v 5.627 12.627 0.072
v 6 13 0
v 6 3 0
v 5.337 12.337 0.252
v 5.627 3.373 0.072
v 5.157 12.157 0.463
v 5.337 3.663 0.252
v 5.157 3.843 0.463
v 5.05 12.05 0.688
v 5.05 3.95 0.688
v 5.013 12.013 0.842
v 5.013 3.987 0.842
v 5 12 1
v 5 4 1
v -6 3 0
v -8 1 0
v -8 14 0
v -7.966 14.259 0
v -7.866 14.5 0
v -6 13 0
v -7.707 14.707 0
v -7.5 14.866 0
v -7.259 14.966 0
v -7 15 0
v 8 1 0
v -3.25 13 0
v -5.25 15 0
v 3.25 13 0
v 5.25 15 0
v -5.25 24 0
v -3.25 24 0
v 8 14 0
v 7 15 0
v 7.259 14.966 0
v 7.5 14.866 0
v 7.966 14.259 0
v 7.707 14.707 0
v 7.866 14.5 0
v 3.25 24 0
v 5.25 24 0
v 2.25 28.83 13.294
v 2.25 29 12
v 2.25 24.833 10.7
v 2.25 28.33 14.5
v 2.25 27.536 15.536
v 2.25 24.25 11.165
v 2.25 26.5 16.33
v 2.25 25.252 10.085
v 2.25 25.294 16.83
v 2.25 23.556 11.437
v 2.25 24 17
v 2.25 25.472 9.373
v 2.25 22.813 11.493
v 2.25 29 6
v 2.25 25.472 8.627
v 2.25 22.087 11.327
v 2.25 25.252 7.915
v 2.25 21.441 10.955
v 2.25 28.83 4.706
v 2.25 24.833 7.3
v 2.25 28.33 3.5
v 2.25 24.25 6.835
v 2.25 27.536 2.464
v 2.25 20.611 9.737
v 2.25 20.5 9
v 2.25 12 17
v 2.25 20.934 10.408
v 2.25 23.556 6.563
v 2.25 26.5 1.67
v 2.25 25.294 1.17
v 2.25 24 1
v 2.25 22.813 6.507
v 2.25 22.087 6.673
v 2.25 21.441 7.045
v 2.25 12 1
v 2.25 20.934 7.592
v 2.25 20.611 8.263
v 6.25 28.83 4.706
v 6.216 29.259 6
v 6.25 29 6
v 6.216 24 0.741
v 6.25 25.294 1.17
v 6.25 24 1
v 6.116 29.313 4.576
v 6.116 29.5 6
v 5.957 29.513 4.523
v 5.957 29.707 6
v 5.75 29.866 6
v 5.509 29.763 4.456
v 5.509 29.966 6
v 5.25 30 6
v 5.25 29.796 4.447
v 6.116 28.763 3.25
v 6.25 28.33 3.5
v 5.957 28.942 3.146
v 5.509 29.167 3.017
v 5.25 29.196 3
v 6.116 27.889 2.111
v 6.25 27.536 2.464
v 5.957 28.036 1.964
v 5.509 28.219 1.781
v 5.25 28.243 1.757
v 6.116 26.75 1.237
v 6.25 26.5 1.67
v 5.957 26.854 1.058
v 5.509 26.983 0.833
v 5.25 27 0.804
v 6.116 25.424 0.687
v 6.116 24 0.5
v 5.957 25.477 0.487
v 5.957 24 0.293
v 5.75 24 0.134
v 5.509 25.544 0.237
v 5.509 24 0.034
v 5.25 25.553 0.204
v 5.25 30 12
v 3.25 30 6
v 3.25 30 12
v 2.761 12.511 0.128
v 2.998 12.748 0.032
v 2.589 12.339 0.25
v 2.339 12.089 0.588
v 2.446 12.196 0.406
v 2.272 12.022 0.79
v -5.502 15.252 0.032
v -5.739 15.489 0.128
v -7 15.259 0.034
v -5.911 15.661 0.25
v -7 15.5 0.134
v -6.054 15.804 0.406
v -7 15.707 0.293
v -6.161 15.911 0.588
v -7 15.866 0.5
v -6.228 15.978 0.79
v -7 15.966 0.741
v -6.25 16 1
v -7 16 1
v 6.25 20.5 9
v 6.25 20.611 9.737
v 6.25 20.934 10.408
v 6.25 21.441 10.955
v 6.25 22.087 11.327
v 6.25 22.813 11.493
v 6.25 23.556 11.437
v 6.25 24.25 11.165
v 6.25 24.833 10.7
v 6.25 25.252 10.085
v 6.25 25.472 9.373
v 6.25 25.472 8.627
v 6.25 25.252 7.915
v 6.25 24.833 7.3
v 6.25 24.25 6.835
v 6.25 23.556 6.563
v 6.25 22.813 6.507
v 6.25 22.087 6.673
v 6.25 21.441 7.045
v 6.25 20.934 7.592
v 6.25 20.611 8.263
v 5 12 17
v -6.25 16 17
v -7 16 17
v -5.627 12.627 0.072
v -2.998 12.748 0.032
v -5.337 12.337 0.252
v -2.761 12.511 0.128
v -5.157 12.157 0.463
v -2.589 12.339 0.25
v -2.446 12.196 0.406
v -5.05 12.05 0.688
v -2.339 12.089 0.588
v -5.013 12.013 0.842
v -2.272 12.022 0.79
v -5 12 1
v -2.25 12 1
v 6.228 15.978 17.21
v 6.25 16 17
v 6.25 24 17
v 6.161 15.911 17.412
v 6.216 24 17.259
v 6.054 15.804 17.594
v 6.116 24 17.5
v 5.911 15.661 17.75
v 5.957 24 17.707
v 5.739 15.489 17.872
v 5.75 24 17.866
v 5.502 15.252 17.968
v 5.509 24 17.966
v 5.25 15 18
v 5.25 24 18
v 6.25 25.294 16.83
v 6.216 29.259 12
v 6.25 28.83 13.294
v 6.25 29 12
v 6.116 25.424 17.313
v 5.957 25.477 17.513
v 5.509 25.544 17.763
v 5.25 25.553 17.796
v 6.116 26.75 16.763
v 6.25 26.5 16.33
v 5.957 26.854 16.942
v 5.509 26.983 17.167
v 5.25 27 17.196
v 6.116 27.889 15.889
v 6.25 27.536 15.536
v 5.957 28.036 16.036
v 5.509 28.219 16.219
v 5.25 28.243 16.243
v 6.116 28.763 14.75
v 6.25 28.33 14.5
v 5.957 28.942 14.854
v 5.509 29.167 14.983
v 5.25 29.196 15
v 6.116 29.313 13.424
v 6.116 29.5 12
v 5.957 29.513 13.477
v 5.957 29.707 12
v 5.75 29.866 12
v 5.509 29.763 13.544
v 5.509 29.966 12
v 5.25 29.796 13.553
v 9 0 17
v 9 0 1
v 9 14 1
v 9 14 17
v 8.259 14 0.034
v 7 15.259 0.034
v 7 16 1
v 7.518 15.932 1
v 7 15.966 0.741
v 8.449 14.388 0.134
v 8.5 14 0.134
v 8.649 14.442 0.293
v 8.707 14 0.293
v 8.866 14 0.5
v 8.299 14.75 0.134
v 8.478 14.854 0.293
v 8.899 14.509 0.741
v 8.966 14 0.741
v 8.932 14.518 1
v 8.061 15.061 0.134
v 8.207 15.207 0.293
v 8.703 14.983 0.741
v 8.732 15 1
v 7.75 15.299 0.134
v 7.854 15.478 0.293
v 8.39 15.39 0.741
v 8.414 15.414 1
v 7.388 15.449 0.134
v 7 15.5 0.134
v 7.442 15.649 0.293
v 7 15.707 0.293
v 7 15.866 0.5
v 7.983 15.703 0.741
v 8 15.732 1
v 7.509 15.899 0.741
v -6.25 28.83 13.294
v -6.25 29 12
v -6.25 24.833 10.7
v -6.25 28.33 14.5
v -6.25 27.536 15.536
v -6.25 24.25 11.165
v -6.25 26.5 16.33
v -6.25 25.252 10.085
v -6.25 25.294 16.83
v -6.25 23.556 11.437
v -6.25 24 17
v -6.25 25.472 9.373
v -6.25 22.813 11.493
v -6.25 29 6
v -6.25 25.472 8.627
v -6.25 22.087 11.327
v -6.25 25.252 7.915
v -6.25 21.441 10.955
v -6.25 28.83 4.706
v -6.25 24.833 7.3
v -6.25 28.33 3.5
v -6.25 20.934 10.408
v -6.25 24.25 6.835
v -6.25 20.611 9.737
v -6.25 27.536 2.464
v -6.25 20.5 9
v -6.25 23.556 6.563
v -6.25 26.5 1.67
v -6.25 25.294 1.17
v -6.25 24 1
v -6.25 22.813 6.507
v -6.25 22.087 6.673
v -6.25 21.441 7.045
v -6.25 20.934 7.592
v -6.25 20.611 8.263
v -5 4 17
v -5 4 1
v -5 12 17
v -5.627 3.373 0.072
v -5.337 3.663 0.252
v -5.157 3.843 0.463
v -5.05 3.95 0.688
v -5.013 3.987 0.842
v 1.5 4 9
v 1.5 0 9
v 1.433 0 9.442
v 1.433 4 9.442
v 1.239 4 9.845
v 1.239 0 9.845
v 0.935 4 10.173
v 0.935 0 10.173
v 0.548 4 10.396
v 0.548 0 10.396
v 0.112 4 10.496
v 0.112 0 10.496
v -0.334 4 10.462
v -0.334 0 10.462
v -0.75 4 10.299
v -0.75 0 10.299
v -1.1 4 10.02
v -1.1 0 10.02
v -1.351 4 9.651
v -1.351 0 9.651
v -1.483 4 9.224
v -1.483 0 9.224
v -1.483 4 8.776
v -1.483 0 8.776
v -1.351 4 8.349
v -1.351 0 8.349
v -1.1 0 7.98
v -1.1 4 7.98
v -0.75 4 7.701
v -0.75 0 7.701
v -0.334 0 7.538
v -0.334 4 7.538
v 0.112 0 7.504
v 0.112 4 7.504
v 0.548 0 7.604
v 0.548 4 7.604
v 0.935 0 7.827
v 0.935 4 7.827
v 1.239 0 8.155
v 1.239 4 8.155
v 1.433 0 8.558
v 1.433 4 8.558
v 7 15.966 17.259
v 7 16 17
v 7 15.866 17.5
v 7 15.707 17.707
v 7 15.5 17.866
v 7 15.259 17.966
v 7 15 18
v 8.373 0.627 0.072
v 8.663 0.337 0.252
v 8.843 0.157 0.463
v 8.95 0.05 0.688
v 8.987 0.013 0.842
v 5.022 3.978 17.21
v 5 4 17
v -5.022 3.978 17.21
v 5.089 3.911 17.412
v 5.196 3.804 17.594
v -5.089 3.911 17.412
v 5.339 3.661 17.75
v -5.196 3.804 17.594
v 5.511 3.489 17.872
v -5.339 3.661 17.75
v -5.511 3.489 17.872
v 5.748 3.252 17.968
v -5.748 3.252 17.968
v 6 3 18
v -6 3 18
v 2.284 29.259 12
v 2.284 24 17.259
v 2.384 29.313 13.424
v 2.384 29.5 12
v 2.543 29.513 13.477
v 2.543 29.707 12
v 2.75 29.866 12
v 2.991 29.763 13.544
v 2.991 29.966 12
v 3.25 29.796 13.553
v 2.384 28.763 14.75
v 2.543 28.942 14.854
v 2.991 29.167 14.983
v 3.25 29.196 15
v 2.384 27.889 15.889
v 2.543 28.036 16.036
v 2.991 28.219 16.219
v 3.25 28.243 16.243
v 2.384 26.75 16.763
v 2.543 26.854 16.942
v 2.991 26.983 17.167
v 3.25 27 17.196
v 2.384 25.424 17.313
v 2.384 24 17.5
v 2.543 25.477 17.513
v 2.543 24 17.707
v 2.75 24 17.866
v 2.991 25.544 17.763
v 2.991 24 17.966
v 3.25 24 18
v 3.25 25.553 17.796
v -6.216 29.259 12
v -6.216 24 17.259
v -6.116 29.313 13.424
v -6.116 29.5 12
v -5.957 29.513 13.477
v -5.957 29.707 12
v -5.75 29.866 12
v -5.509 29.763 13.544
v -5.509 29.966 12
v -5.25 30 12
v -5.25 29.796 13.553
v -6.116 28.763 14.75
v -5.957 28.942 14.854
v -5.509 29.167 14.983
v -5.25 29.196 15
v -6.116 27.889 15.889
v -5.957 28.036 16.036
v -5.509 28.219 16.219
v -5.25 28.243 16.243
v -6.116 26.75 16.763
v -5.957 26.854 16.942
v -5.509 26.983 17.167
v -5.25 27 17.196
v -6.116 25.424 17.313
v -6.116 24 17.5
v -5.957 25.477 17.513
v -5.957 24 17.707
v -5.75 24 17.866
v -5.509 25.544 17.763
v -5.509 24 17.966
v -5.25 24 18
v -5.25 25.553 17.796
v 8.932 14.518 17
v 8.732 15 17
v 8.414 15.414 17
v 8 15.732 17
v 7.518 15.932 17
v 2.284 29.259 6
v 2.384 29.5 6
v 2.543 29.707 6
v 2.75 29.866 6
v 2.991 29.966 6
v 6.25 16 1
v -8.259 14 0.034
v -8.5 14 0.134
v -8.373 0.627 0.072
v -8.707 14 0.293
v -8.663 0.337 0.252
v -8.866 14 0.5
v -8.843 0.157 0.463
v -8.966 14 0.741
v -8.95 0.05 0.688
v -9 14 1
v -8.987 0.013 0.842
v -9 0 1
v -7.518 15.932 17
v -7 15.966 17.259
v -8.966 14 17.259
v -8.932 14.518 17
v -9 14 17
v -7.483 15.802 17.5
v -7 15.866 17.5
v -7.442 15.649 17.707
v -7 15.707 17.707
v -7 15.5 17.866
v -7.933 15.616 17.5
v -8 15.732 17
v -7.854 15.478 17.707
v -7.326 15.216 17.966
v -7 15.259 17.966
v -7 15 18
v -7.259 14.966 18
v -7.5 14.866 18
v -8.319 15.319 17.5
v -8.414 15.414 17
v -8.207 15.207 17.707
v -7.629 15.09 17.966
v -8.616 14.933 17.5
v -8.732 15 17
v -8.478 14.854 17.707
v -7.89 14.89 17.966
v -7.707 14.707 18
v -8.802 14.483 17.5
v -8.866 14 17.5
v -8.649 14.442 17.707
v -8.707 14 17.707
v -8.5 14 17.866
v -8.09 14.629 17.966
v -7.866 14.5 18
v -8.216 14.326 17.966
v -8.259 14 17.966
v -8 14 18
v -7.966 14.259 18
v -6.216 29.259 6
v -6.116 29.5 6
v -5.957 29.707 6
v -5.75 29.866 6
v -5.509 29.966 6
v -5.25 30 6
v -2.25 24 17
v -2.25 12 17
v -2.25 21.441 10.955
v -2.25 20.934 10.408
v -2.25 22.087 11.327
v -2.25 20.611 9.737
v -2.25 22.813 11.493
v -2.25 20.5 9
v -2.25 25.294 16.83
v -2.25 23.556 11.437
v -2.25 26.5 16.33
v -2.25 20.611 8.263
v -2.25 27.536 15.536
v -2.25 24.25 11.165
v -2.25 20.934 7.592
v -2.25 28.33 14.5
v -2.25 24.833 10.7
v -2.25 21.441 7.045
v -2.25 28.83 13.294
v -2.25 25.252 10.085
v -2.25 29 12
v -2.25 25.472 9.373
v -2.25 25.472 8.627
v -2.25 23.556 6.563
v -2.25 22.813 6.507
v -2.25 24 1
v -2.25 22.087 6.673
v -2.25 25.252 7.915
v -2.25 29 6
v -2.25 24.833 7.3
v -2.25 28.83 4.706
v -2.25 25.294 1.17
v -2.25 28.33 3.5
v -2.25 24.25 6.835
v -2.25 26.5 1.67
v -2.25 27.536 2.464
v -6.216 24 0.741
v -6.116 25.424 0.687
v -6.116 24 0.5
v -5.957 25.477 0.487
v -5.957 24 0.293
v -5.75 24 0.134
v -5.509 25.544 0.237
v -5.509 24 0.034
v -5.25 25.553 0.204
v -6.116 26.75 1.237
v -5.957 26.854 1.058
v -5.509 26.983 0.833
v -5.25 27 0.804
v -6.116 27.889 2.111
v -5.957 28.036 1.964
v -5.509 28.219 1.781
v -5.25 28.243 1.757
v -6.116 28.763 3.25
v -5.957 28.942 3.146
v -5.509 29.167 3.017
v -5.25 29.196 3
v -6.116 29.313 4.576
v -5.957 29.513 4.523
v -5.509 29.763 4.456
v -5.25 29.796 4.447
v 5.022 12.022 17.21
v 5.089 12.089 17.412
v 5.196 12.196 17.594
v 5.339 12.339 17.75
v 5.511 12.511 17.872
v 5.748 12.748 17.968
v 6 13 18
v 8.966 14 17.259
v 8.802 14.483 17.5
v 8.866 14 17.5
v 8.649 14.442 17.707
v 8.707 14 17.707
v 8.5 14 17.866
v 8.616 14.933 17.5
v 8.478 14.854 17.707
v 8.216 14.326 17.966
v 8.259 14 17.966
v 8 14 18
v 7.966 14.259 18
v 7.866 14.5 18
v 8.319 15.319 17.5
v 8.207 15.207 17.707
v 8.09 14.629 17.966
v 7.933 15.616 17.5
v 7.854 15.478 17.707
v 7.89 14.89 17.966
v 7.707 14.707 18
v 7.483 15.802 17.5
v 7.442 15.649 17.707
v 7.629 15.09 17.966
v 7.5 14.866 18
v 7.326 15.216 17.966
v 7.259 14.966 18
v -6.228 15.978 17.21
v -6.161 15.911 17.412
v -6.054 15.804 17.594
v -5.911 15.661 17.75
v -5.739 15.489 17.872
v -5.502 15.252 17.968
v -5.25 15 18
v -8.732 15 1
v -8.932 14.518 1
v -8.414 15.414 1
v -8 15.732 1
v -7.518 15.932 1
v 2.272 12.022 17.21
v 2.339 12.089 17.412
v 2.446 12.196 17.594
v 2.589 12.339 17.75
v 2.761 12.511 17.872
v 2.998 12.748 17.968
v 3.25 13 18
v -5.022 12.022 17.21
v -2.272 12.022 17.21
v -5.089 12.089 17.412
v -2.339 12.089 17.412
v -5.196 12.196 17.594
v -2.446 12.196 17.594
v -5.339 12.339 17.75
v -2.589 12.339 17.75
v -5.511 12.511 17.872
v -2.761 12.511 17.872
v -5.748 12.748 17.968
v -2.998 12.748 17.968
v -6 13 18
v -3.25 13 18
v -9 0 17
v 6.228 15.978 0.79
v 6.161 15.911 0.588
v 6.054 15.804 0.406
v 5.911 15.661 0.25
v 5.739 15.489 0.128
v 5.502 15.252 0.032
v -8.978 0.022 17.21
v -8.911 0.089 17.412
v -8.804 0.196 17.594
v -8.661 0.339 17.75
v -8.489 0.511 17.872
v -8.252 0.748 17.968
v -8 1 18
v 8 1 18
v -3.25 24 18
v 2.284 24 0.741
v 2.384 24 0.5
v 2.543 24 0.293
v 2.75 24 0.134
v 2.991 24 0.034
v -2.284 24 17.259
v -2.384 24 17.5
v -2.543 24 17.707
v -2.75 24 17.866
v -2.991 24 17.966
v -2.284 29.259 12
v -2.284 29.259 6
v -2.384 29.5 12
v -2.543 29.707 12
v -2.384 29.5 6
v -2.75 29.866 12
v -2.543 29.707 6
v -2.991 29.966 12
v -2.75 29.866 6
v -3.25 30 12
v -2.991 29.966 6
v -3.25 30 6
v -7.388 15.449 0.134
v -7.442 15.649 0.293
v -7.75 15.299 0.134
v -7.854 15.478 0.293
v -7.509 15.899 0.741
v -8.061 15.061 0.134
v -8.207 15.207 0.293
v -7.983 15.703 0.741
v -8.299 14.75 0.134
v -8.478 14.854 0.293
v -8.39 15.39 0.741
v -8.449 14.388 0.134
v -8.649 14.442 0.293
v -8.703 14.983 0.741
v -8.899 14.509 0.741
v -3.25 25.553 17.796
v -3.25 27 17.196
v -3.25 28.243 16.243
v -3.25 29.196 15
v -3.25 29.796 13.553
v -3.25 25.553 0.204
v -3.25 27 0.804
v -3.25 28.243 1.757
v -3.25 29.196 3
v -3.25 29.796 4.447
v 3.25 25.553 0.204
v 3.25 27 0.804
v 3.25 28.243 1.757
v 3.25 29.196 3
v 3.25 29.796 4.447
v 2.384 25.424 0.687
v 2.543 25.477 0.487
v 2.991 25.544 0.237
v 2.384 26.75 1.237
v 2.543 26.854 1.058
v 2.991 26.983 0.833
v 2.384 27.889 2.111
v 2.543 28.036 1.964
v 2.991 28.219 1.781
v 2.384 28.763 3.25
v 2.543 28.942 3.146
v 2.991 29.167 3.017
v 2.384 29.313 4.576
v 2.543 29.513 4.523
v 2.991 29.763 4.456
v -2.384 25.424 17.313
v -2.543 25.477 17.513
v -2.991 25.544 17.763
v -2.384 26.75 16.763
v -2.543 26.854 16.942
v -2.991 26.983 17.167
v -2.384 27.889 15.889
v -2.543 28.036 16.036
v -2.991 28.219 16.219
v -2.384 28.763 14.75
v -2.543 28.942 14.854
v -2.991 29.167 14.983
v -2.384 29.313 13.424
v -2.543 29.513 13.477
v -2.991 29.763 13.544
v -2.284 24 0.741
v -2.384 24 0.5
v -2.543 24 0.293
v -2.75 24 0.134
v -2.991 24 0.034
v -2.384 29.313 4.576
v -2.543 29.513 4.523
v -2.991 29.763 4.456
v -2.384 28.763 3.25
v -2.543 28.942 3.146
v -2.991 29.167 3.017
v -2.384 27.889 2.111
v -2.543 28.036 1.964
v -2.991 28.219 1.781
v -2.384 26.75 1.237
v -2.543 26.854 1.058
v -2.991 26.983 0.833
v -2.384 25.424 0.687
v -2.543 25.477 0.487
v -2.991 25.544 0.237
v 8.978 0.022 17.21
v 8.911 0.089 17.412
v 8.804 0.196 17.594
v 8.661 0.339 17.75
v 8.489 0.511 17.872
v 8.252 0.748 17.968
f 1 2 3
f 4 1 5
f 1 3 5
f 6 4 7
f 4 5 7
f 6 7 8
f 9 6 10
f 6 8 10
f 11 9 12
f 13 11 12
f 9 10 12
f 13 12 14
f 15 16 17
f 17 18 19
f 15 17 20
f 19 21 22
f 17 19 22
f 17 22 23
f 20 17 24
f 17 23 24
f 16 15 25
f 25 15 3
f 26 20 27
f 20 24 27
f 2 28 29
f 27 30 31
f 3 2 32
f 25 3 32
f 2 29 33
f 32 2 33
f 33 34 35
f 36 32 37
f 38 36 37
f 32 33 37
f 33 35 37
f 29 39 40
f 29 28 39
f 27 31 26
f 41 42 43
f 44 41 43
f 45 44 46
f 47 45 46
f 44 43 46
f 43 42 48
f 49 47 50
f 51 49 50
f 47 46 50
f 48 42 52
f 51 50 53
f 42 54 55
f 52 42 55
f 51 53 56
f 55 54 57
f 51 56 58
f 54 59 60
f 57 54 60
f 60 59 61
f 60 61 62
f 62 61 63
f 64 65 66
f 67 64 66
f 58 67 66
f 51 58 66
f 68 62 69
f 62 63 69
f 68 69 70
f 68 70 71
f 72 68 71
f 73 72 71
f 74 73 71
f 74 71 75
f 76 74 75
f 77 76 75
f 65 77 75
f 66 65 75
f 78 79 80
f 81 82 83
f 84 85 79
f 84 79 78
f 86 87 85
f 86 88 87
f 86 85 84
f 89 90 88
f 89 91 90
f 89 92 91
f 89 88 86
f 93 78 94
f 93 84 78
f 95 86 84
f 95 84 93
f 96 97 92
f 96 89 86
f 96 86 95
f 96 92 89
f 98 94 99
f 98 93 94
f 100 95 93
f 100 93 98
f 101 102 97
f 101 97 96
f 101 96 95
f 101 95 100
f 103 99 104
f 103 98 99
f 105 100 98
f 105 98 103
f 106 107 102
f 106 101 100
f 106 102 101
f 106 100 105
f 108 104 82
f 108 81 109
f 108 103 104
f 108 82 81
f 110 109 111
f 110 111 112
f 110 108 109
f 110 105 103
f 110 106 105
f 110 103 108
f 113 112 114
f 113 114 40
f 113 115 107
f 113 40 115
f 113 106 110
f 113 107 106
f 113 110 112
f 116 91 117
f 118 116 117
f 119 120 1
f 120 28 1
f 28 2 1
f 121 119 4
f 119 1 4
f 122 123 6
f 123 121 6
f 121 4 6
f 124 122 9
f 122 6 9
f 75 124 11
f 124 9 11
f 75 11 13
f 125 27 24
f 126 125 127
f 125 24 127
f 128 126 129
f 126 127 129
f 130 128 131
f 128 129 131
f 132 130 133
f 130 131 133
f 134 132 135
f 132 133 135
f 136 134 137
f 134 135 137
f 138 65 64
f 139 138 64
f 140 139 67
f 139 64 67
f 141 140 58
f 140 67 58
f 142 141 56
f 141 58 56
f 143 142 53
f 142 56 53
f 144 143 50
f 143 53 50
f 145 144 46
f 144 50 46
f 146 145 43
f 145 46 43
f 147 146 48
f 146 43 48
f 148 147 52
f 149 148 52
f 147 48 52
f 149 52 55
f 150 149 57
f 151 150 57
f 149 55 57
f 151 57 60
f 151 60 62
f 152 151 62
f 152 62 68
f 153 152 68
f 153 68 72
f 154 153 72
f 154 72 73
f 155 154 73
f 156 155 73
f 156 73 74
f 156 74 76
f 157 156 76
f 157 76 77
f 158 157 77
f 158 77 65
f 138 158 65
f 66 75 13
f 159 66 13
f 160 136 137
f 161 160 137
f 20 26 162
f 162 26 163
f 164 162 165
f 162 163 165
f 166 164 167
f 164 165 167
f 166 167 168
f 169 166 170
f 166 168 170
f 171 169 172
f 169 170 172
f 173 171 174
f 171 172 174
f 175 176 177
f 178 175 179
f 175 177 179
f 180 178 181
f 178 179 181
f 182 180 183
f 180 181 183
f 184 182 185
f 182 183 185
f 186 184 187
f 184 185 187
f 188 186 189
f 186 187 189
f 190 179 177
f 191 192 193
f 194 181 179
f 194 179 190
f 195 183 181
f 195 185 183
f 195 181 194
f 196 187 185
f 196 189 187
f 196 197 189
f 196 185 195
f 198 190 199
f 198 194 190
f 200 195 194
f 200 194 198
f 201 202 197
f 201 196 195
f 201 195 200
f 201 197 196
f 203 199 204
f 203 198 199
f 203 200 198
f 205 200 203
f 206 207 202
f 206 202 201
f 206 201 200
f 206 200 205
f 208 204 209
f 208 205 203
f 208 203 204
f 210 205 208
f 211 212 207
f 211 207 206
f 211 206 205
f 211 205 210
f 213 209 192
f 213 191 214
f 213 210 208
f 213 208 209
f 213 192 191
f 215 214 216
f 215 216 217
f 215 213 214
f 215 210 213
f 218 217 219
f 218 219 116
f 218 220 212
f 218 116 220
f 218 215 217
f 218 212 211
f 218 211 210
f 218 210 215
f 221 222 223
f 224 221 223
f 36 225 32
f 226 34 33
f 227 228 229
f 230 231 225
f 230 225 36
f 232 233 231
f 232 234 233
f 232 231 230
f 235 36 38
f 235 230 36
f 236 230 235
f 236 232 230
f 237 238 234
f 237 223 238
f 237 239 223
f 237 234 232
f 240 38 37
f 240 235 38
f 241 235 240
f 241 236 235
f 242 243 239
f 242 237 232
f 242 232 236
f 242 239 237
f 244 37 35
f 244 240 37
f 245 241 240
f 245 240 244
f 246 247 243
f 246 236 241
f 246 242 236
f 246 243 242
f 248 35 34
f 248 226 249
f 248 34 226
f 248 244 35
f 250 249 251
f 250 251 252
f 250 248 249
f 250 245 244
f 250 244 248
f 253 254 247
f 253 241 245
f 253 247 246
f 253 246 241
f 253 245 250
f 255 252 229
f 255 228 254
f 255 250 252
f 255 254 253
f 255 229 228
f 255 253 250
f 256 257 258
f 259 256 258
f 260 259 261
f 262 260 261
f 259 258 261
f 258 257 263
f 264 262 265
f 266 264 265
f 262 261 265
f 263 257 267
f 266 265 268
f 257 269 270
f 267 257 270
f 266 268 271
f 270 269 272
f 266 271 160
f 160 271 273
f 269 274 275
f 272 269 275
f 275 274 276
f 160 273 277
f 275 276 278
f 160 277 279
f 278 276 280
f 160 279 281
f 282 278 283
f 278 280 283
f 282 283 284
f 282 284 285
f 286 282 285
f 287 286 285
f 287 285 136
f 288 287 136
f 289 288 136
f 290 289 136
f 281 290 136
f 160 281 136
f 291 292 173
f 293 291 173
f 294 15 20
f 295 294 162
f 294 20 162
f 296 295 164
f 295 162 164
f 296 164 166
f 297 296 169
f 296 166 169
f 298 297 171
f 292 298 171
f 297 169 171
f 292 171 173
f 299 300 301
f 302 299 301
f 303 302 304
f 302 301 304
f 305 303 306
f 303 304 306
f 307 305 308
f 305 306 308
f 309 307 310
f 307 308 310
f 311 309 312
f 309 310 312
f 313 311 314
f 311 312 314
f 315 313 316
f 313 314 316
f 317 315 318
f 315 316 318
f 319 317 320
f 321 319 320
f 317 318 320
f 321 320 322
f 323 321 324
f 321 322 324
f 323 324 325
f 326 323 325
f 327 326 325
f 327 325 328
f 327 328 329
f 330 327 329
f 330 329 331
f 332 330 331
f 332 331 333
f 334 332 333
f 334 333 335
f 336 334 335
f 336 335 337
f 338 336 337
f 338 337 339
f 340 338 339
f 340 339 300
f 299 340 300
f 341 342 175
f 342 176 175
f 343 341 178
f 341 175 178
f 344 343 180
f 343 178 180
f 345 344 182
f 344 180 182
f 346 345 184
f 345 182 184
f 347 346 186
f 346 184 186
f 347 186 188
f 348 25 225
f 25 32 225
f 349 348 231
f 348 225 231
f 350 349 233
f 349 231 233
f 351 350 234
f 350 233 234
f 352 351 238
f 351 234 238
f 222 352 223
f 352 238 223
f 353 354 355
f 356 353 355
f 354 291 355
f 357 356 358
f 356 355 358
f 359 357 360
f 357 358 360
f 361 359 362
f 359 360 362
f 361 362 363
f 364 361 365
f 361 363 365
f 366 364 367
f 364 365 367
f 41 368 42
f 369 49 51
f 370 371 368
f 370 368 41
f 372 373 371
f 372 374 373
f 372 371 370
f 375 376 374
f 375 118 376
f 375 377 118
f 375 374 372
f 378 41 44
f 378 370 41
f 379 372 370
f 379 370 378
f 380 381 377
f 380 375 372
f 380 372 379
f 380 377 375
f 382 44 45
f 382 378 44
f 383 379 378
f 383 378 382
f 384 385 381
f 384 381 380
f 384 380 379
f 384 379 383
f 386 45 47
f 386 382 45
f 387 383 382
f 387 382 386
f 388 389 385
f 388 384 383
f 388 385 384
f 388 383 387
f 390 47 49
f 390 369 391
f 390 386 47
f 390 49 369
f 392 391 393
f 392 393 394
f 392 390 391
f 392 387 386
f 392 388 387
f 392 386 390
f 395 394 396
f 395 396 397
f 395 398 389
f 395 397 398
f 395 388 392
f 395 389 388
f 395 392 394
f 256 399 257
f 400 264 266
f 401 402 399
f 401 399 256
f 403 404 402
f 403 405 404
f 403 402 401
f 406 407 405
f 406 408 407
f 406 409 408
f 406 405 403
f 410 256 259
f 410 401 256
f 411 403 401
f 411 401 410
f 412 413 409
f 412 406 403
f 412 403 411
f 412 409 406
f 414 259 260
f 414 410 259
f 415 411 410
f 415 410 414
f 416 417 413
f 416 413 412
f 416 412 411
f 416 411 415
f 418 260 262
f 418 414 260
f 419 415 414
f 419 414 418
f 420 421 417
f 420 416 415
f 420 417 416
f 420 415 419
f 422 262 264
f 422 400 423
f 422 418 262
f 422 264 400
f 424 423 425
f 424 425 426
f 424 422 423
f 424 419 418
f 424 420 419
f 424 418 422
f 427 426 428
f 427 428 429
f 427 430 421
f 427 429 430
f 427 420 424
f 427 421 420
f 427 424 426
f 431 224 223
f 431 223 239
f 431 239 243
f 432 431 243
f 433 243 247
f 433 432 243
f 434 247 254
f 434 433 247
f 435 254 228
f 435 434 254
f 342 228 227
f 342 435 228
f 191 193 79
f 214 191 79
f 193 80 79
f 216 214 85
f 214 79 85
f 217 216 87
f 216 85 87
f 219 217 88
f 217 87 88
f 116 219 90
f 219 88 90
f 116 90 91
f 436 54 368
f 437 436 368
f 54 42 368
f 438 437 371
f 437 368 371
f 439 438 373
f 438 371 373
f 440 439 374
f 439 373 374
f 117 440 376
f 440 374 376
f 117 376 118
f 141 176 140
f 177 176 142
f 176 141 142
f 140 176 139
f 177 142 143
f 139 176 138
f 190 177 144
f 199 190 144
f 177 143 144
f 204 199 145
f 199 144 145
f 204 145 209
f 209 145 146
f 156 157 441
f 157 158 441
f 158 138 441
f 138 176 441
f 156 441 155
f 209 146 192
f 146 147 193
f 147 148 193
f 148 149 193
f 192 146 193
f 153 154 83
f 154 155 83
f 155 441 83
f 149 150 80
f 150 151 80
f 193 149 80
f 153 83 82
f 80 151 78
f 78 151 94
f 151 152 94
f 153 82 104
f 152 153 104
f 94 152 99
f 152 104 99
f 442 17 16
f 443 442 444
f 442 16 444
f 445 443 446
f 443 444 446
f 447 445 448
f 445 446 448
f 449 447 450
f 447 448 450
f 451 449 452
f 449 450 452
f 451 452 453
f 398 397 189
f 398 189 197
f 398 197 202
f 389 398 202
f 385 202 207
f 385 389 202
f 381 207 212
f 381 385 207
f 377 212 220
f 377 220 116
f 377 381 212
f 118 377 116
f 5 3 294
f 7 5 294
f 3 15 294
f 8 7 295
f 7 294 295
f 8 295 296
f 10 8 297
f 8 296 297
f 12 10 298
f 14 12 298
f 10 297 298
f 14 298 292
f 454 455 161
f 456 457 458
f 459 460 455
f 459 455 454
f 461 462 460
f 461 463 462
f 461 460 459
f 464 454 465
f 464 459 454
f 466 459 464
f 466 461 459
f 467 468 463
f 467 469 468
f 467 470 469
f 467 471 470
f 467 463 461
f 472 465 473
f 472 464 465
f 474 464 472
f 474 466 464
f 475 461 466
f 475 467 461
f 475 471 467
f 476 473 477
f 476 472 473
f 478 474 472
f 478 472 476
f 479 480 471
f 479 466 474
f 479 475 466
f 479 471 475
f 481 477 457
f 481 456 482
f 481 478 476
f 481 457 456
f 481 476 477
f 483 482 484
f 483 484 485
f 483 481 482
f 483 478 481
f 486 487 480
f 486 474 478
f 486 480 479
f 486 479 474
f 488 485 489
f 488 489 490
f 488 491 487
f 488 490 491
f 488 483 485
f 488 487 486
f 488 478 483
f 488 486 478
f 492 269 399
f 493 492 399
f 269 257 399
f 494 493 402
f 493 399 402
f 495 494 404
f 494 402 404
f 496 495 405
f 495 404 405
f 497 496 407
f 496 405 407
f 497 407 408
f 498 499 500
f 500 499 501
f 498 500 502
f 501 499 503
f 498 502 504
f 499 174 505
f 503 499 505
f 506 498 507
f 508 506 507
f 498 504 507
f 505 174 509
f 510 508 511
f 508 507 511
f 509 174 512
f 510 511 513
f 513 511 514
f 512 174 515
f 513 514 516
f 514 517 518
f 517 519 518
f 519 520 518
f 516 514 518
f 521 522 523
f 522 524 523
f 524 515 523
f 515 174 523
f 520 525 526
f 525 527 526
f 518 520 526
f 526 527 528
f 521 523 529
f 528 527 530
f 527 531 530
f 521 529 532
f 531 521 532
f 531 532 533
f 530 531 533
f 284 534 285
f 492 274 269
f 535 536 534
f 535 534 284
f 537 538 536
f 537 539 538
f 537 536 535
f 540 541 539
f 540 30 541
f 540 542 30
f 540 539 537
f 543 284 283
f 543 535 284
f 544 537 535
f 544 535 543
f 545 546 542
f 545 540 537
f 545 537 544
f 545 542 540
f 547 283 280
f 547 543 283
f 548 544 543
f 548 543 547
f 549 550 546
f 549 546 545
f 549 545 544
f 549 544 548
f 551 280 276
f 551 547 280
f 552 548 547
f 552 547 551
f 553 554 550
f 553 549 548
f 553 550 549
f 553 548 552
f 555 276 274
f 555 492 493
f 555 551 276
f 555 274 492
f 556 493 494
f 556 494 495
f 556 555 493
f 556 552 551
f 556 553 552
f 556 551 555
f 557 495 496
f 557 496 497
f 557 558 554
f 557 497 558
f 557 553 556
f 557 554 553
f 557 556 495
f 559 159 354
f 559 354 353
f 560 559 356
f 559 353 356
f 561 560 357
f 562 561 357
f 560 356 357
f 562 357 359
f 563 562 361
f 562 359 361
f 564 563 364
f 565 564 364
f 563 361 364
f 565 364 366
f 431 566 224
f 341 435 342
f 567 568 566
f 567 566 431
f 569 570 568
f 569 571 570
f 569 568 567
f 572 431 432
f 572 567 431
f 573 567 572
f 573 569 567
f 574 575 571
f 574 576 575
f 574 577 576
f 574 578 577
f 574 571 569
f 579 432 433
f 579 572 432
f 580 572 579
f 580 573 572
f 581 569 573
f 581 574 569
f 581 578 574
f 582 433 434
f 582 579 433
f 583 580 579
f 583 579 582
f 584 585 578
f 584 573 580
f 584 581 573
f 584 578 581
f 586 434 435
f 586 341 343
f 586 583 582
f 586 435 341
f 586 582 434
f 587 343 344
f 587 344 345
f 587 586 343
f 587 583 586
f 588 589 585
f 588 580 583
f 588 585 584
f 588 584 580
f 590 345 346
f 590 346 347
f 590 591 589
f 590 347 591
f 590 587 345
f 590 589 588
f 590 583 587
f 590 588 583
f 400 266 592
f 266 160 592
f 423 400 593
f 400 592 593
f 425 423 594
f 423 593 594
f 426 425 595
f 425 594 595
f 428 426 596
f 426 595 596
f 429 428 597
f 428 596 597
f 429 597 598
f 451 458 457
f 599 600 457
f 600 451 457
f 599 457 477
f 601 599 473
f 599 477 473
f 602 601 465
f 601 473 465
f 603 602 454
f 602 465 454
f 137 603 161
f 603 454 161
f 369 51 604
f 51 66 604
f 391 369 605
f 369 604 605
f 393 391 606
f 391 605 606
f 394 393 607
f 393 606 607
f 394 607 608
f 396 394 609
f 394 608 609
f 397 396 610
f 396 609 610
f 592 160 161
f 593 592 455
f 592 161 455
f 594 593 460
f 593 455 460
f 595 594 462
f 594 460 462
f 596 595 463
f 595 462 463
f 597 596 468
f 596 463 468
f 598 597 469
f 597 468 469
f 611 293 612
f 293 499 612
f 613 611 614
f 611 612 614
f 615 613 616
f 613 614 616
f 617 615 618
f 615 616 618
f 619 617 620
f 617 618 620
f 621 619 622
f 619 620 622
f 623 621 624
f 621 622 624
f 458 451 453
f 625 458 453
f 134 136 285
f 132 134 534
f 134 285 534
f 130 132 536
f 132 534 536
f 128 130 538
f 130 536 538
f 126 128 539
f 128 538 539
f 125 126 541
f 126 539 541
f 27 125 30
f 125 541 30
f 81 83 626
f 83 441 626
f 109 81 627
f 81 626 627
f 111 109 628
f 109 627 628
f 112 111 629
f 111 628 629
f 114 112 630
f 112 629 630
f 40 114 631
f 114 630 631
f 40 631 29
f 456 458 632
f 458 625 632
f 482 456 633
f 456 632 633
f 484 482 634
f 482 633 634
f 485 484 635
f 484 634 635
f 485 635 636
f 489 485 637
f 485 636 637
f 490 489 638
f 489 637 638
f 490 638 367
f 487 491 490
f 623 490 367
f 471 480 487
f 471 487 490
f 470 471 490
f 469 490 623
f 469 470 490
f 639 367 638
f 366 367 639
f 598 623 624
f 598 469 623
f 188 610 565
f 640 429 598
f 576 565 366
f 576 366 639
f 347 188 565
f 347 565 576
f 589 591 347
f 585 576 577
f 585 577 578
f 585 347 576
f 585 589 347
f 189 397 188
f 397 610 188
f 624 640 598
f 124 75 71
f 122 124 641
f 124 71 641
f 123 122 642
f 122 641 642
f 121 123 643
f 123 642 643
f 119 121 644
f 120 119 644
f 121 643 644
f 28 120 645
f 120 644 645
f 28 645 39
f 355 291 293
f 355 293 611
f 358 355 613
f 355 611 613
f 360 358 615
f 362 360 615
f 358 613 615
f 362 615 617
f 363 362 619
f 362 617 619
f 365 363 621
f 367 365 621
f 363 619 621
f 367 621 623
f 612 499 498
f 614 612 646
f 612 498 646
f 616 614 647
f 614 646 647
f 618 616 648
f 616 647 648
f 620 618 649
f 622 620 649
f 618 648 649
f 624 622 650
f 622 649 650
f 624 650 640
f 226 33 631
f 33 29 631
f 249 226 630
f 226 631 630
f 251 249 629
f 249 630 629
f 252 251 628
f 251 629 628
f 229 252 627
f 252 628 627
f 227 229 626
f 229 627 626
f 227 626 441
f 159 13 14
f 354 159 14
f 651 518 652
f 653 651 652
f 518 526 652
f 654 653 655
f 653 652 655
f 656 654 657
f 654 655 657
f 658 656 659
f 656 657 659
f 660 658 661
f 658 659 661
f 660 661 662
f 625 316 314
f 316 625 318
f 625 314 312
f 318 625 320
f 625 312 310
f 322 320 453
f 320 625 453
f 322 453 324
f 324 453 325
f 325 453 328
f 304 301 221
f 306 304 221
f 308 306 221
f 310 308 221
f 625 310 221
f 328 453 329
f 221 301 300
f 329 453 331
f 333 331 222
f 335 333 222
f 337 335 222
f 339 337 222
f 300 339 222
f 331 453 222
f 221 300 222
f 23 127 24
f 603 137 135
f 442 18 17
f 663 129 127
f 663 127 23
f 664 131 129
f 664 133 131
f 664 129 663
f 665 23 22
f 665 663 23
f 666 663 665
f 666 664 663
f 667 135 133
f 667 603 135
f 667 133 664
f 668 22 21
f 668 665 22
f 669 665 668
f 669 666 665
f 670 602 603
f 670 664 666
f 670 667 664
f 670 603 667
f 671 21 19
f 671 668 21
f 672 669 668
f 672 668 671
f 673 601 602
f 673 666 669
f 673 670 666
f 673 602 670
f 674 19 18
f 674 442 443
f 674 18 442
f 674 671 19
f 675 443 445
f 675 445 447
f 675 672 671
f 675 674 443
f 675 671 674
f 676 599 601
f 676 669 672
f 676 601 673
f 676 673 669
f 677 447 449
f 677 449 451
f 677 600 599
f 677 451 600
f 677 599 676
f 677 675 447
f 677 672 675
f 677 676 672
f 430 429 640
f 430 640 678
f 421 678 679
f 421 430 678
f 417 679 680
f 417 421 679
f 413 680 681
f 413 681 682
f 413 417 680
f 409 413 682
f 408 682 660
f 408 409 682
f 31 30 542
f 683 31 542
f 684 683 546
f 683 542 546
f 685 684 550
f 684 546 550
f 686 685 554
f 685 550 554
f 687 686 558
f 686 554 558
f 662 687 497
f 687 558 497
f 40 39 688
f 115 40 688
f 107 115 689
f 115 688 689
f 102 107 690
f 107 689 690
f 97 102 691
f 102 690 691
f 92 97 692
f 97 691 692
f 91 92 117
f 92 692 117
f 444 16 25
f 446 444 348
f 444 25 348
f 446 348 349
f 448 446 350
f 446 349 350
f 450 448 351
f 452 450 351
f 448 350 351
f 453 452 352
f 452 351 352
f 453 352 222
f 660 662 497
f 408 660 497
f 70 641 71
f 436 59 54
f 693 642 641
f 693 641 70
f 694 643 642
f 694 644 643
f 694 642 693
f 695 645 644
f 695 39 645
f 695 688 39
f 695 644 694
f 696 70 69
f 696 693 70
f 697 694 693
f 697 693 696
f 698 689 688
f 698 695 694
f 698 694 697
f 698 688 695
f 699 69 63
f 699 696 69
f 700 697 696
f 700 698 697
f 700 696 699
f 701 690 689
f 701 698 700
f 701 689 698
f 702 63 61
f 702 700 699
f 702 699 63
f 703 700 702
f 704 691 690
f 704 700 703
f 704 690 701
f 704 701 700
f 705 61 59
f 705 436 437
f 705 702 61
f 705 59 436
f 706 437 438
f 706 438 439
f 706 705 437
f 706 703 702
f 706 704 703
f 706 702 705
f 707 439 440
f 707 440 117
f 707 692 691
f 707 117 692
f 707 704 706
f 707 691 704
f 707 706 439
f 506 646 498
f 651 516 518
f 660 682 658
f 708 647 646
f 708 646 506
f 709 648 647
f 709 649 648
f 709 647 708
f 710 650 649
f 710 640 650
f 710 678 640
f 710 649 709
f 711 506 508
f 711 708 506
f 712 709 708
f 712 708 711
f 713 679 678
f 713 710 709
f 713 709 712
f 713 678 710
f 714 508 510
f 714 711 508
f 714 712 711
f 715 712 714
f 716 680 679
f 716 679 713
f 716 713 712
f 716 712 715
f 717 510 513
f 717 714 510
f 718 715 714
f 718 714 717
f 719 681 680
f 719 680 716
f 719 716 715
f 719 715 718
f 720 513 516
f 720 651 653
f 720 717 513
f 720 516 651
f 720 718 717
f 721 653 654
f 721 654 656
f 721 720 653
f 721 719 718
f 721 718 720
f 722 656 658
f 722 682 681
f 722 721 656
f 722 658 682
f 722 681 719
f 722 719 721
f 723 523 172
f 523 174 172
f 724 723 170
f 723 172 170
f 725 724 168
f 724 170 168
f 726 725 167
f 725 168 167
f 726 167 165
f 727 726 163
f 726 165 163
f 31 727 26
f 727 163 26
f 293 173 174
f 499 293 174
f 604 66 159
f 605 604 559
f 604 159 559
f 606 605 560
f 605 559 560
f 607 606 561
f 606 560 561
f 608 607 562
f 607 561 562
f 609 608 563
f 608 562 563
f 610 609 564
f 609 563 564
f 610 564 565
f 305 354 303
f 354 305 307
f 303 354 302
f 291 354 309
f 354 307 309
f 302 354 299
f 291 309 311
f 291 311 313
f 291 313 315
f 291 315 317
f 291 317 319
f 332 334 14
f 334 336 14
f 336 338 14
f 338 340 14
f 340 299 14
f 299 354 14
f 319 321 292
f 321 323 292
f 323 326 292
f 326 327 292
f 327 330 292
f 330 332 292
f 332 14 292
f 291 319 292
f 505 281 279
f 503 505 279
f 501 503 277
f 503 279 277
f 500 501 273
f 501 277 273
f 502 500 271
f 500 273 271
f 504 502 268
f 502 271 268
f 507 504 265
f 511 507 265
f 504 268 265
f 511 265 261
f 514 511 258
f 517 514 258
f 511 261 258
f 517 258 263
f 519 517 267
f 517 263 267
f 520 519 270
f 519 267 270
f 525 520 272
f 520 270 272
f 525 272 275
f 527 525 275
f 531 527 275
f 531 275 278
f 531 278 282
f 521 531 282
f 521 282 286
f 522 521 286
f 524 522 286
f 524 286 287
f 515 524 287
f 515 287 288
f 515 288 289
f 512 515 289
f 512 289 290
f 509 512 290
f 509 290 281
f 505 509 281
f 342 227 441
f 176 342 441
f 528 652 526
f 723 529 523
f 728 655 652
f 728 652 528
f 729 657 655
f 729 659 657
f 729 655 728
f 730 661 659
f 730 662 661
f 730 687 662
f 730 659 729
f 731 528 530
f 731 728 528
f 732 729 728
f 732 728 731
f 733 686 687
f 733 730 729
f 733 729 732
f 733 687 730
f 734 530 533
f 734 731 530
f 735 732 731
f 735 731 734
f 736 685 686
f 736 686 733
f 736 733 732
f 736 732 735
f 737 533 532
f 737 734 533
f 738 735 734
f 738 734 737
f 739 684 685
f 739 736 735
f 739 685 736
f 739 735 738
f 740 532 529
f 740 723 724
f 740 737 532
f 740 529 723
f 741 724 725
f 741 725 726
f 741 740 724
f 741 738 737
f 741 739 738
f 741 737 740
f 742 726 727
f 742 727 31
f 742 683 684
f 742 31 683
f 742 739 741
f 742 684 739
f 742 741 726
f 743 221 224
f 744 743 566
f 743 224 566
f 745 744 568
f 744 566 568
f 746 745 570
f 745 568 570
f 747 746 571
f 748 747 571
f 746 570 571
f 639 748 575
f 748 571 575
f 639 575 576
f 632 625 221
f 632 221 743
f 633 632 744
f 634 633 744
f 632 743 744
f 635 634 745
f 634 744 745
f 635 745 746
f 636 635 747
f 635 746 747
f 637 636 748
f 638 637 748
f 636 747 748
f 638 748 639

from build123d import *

# Parameters (mm, degrees)
PAD_DEPTH       = 18
SKETCH002_R     = 2.5
POCKET_DEPTH    = 15.251
SKETCH003_R     = 1.5
POCKET001_DEPTH = 30.001
FILLET_R        = 2
FILLET001_R     = 6
FILLET002_R     = 1


with BuildPart() as part:
    # Sketch → Pad (new body)
    with BuildSketch(Plane.XY):
        Polygon((-9, 0), (9, 0), (9, 16), (6.25, 16), (6.25, 30), (2.25, 30), (2.25, 12), (5, 12), (5, 4), (-5, 4), (-5, 12), (-2.25, 12), (-2.25, 30), (-6.25, 30), (-6.25, 16), (-9, 16), align=None)
    extrude(amount=PAD_DEPTH)

    # Sketch002 (on Face15 of Pad) → Pocket (cut, through all)
    with BuildSketch(Plane(origin=(-6.25, 0, 0), x_dir=(0, -1, 0), z_dir=(-1, 0, 0))):
        with Locations((-23, 9)):
            Circle(SKETCH002_R)
    extrude(amount=-POCKET_DEPTH, mode=Mode.SUBTRACT)

    # Sketch003 (on Face2 of Pocket) → Pocket001 (cut, through all)
    with BuildSketch(Plane.XZ):
        with Locations((0, 9)):
            Circle(SKETCH003_R)
    extrude(amount=-POCKET001_DEPTH, mode=Mode.SUBTRACT)

    # Fillet
    fillet_edges = [part.edges().sort_by_distance(p)[0] for p in [
        (-9, 16, 9),
        (9, 16, 9),
    ]]
    fillet(fillet_edges, radius=FILLET_R)

    # Fillet001
    fillet001_edges = [part.edges().sort_by_distance(p)[0] for p in [
        (4.25, 30, 0),
        (-4.25, 30, 0),
        (4.25, 30, 18),
        (-4.25, 30, 18),
    ]]
    fillet(fillet001_edges, radius=FILLET001_R)

    # Fillet002
    fillet002_edges = [part.edges().sort_by_distance(p)[0] for p in [
        (-6.25, 20, 18),
        (-4.25, 24, 18),
        (-6.625, 16, 18),
        (-2.25, 18, 18),
        (-8.414214, 15.414214, 18),
        (-3.625, 12, 18),
        (-9, 7, 18),
        (-5, 8, 18),
        (0, 0, 18),
        (0, 4, 18),
        (9, 7, 18),
        (5, 8, 18),
        (8.414214, 15.414214, 18),
        (3.625, 12, 18),
        (6.625, 16, 18),
        (2.25, 18, 18),
        (6.25, 20, 18),
        (4.25, 24, 18),
        (-6.25, 20, 0),
        (-4.25, 24, 0),
        (-6.625, 16, 0),
        (-2.25, 18, 0),
        (-8.414214, 15.414214, 0),
        (-3.625, 12, 0),
        (-9, 7, 0),
        (-5, 8, 0),
        (0, 0, 0),
        (0, 4, 0),
        (9, 7, 0),
        (5, 8, 0),
        (8.414214, 15.414214, 0),
        (3.625, 12, 0),
        (6.625, 16, 0),
        (2.25, 18, 0),
        (6.25, 20, 0),
        (4.25, 24, 0),
    ]]
    fillet(fillet002_edges, radius=FILLET002_R)


solid = part.part
